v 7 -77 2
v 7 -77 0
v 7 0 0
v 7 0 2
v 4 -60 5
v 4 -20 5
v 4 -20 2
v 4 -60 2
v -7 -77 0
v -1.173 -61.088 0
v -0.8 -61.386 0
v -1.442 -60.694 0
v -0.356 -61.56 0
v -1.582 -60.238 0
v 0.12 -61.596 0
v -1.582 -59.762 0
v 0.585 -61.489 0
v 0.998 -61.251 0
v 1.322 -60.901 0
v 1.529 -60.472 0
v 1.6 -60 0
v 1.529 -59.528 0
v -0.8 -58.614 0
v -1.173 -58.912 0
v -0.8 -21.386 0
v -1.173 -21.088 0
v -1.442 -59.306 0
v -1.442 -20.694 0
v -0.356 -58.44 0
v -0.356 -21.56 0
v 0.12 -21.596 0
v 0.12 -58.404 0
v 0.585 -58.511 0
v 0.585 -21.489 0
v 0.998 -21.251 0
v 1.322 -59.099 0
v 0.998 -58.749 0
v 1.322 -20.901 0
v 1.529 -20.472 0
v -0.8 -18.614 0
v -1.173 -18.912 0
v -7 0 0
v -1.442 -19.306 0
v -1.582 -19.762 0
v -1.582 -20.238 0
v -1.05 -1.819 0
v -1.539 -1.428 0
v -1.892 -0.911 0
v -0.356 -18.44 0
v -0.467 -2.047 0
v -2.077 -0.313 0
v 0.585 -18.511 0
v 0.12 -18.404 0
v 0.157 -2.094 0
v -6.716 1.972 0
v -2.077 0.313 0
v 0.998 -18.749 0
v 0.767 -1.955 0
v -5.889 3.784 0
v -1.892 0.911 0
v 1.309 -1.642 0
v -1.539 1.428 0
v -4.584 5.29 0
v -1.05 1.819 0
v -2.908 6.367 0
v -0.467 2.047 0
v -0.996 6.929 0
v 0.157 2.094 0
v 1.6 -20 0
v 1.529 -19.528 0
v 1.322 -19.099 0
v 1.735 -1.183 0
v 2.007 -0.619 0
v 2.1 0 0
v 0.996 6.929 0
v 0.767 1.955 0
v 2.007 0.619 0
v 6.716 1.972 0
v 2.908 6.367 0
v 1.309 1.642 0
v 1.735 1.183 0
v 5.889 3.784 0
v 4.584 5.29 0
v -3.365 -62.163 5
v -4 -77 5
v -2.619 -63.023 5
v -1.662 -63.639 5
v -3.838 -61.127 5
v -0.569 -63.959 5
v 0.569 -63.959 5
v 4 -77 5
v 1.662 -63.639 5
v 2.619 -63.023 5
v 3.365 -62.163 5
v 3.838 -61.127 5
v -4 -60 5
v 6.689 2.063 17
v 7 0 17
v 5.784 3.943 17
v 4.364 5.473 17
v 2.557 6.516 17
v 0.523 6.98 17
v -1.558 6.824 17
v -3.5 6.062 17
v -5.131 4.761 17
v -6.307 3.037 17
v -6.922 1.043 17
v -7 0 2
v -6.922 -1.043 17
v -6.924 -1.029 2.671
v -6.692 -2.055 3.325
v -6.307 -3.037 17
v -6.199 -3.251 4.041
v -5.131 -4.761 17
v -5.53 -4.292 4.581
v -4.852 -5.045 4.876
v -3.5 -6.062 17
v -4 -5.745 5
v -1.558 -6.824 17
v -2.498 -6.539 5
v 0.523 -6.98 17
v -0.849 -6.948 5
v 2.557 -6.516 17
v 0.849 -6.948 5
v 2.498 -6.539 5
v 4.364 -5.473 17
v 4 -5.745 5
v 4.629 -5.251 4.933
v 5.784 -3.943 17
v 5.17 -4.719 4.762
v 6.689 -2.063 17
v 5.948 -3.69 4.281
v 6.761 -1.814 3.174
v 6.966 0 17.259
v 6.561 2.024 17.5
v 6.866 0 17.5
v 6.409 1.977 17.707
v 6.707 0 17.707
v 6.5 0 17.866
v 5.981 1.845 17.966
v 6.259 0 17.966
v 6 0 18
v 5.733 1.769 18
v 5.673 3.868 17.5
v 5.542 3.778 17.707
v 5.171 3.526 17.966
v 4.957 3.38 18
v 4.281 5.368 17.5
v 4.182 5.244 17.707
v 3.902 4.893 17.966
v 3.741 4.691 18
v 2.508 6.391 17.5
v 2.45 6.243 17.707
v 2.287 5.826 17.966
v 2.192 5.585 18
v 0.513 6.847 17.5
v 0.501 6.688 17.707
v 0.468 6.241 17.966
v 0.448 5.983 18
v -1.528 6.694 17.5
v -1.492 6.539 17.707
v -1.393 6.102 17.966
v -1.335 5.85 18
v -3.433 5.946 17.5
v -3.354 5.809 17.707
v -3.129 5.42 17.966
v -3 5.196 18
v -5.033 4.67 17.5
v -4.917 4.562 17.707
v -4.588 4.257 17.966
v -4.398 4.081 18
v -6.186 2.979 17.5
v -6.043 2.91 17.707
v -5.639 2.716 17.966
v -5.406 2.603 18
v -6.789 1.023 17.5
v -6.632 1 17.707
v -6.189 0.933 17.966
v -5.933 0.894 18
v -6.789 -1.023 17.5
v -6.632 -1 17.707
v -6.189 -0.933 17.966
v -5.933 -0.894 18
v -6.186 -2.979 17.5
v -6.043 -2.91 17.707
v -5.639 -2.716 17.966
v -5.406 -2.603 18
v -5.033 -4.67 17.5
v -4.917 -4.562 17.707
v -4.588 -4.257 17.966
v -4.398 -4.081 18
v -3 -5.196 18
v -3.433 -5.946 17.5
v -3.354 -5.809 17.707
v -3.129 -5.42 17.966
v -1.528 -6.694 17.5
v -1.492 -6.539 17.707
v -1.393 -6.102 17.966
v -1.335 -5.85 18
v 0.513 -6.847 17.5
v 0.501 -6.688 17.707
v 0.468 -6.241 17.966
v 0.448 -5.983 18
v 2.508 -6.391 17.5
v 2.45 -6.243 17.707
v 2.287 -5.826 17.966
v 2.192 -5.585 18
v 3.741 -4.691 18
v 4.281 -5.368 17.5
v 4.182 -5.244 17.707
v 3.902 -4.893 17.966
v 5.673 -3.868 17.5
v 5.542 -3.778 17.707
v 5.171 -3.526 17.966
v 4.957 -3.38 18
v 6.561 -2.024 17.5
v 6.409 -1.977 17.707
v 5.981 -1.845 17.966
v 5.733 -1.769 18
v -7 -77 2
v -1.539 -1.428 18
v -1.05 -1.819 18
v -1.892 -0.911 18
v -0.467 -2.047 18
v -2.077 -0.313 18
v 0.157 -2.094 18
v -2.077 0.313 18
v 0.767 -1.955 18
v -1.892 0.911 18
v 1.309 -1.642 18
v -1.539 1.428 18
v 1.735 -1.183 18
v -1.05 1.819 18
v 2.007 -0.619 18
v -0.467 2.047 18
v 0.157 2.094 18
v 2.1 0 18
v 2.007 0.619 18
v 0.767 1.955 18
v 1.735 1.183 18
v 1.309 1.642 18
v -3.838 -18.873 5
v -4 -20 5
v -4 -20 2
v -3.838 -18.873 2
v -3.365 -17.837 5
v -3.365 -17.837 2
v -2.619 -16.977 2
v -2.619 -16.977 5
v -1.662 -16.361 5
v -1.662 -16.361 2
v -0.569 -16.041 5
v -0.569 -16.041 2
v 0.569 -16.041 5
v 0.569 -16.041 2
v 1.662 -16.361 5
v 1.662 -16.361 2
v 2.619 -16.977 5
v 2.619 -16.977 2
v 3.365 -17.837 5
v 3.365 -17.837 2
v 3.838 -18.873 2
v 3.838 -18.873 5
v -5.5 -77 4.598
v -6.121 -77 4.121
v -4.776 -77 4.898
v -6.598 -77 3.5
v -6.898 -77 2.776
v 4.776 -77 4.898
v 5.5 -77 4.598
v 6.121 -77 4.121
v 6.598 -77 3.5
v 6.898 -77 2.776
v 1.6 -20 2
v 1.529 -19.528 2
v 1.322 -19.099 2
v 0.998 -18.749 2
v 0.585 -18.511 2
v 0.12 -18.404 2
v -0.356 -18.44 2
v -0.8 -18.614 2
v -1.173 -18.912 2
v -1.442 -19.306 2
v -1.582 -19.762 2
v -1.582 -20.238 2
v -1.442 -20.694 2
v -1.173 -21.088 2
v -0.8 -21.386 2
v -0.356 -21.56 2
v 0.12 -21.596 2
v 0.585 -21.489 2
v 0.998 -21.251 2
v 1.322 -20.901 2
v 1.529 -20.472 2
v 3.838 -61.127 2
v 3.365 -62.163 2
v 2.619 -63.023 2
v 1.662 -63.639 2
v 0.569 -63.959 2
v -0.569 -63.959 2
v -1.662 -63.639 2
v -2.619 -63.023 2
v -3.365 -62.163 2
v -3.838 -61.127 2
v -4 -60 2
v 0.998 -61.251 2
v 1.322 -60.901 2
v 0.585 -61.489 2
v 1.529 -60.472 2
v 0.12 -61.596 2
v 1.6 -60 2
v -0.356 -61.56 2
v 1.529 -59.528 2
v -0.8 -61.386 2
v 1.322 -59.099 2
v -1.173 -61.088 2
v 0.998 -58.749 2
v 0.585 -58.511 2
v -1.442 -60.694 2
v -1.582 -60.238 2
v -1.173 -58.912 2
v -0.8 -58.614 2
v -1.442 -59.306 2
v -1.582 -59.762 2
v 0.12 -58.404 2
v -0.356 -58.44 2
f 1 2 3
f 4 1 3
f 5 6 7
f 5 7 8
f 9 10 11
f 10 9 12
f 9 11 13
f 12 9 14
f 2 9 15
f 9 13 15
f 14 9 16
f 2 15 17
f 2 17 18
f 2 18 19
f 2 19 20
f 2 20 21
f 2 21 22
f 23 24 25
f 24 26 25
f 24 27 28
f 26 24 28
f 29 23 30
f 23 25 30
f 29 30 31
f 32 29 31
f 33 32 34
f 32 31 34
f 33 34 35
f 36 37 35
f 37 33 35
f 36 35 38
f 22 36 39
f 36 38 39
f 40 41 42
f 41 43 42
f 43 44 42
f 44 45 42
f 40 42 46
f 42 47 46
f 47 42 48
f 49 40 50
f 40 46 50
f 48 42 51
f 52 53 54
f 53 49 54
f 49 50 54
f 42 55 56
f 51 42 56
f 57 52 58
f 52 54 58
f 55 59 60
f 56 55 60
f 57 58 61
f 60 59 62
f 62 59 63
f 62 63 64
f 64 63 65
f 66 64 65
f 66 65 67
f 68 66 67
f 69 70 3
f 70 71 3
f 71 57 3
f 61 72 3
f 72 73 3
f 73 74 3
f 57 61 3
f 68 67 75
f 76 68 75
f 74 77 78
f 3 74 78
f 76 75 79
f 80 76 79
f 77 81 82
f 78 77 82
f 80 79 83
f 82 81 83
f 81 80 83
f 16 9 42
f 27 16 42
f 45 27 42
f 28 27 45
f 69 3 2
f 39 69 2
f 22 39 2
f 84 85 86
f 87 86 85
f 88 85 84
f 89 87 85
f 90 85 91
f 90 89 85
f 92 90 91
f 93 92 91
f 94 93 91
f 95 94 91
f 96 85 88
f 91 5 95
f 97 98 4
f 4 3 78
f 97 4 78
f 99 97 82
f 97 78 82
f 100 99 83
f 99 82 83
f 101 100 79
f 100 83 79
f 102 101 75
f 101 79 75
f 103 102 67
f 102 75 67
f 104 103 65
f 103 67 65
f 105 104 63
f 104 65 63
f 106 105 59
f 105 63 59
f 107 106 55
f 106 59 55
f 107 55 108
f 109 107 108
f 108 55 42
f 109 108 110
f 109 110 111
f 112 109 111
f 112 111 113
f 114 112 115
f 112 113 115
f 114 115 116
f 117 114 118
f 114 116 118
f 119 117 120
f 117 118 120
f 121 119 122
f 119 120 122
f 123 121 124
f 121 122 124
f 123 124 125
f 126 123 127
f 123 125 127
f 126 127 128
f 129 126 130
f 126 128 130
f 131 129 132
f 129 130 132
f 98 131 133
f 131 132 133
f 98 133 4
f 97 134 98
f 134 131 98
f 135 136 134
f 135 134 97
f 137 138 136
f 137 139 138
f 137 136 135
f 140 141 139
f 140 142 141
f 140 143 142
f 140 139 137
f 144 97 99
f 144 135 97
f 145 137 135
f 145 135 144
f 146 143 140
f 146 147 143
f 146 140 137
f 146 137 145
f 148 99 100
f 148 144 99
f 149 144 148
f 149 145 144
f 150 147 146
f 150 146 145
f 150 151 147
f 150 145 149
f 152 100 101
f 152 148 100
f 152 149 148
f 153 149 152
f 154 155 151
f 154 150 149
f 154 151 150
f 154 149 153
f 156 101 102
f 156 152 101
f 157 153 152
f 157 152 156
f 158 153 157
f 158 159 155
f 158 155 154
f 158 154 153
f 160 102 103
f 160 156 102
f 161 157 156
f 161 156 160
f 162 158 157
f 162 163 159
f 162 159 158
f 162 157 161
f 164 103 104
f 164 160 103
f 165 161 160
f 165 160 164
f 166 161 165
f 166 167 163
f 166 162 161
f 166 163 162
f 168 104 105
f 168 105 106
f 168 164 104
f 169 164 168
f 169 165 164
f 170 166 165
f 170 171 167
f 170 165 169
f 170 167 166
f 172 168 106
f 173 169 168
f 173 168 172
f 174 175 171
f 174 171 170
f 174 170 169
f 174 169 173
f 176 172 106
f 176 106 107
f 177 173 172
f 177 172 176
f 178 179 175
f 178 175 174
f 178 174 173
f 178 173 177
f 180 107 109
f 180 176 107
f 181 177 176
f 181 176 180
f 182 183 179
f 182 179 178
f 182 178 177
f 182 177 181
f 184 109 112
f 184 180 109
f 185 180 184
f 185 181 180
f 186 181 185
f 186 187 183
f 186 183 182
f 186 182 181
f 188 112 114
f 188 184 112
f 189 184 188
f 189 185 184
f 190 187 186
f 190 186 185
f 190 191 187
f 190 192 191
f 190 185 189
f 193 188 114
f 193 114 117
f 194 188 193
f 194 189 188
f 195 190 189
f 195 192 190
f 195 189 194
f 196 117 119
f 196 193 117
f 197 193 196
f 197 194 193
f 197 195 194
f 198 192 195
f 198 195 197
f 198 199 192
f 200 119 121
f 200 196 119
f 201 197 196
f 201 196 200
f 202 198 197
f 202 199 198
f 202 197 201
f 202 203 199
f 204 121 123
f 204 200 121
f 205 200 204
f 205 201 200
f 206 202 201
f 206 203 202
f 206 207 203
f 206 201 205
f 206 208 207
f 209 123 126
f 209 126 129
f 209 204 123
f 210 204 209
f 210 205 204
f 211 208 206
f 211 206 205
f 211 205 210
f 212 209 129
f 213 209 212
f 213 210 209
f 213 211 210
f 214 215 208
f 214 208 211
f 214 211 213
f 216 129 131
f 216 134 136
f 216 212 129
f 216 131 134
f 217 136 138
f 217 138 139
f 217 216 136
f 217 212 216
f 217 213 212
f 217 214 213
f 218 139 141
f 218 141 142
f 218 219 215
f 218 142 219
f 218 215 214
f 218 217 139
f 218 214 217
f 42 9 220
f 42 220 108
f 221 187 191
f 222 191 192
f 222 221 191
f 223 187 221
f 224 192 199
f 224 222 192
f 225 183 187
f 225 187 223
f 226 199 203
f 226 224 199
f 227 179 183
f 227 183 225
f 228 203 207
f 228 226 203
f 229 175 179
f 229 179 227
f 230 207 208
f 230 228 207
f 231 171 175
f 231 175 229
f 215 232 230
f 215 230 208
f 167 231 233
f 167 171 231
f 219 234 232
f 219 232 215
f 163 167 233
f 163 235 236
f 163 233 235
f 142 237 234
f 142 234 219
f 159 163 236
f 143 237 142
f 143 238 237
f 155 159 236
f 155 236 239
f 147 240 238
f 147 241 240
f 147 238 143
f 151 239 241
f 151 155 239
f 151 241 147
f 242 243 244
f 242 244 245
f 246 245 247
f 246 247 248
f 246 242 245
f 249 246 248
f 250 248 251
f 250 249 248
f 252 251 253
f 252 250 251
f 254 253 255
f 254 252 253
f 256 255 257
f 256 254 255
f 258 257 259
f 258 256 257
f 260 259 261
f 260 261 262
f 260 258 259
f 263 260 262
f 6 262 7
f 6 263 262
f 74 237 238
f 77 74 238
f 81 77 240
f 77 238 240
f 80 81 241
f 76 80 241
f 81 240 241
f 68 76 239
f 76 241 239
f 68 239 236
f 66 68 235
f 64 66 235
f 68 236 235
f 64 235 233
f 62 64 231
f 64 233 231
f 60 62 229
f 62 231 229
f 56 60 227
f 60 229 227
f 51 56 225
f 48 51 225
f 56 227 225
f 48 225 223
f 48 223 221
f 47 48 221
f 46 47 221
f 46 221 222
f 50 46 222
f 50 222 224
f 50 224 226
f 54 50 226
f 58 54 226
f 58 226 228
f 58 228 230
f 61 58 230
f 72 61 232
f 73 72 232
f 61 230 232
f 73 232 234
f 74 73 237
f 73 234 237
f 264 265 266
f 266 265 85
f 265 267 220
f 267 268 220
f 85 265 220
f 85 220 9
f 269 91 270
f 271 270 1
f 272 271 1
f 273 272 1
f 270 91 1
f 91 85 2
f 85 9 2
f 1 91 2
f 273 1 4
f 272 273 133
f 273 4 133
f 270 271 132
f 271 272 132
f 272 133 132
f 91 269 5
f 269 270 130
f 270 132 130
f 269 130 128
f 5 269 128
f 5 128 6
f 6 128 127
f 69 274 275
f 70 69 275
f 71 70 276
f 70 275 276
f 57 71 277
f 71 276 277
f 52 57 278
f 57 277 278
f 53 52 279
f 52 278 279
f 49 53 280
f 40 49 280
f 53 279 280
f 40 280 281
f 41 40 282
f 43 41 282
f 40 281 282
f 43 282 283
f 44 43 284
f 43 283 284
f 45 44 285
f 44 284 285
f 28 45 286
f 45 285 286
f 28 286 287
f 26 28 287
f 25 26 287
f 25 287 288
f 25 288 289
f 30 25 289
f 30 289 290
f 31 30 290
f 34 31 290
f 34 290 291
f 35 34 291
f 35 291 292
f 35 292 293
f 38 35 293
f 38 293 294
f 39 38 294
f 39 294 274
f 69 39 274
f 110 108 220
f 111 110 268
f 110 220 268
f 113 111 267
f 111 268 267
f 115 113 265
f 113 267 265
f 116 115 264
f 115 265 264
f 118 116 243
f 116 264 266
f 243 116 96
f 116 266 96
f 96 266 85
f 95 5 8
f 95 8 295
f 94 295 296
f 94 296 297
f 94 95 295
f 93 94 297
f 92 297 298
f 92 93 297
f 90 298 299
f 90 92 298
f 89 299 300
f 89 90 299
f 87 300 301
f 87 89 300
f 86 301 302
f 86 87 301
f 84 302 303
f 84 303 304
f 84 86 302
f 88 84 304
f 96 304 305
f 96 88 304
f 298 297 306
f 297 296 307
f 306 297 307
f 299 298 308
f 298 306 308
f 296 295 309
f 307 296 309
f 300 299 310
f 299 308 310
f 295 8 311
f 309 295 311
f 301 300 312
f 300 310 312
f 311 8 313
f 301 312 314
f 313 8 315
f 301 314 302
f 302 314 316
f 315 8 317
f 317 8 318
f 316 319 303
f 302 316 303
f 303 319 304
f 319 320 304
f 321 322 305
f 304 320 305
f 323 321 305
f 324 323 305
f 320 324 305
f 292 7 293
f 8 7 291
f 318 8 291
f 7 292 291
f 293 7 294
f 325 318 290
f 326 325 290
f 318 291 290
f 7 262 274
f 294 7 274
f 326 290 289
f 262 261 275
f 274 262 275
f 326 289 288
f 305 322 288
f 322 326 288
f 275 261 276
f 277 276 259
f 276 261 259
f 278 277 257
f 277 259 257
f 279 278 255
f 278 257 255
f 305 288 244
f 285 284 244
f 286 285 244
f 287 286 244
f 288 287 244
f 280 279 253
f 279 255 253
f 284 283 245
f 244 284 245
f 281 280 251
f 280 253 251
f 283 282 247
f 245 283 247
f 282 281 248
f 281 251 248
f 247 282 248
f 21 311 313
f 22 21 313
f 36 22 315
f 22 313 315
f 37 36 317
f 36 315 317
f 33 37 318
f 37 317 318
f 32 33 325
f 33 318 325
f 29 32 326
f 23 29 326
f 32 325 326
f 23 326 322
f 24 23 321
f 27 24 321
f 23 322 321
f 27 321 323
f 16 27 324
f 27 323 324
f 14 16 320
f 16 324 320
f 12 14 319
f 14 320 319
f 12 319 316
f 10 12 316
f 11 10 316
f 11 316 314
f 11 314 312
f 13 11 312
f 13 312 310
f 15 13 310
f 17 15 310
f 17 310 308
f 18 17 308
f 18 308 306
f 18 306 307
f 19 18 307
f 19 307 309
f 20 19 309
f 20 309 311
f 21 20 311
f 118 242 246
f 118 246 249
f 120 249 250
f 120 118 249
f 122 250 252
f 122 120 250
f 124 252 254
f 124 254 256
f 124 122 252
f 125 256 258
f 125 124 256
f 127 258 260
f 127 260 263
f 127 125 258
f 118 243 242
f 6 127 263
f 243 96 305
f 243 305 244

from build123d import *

# Parameters (mm, degrees)
SKETCH1_R           = 7
BOSS_EXTRUDE1_DEPTH = 18
SKETCH2_W           = 14
SKETCH2_H           = 77
BOSS_EXTRUDE2_DEPTH = 5
SKETCH8_R           = 2.1
CUT_EXTRUDE5_DEPTH  = 18
FILLET3_R           = 3
CUT_EXTRUDE6_DEPTH  = 3
SKETCH10_R          = 1.6
CUT_EXTRUDE7_DEPTH  = 3
FILLET4_R           = 1


with BuildPart() as part:
    # Sketch1 → Boss-Extrude1 (new body)
    with BuildSketch(Plane.XY):
        Circle(SKETCH1_R)
    extrude(amount=BOSS_EXTRUDE1_DEPTH)

    # Sketch2 → Boss-Extrude2 (add)
    with BuildSketch(Plane.XY):
        with Locations((0, -38.5)):
            Rectangle(SKETCH2_W, SKETCH2_H)
    extrude(amount=BOSS_EXTRUDE2_DEPTH)

    # Sketch8 → Cut-Extrude5 (cut)
    with BuildSketch(Plane.XY.offset(18)):
        Circle(SKETCH8_R)
    extrude(amount=-CUT_EXTRUDE5_DEPTH, mode=Mode.SUBTRACT)

    # Fillet3
    # the kernel refuses this fillet: 3 mm, written as the material it takes off along each edge
    with BuildSketch(Plane(origin=(7, 7.5, 5), x_dir=(-1, 0, 0), z_dir=(0, -1, 0))) as fillet3_piece_1_section:
        with BuildLine():
            CenterArc((FILLET3_R, FILLET3_R), FILLET3_R, 180, 90)
            Line((0, FILLET3_R), (0, 0))
            Line((0, 0), (FILLET3_R, 0))
        make_face()
    fillet3_piece_1 = extrude(amount=92, mode=Mode.PRIVATE)
    fillet3_piece_1 = fillet3_piece_1 - Plane(origin=(0, 0, 4.306838987), x_dir=(1, 0, 0), z_dir=(0, 0, -1)) * Cylinder(7, 196, mode=Mode.PRIVATE)
    add(fillet3_piece_1, mode=Mode.SUBTRACT)
    with BuildSketch(Plane(origin=(-7, -84.5, 5), x_dir=(0, 0, -1), z_dir=(0, 1, 0))) as fillet3_piece_2_section:
        with BuildLine():
            CenterArc((FILLET3_R, -FILLET3_R), FILLET3_R, 90, 90)
            Line((0, -FILLET3_R), (0, 0))
            Line((0, 0), (FILLET3_R, 0))
        make_face()
    fillet3_piece_2 = extrude(amount=92, mode=Mode.PRIVATE)
    fillet3_piece_2 = fillet3_piece_2 - Plane(origin=(0, 0, 4.306838506), x_dir=(1, 0, 0), z_dir=(0, 0, -1)) * Cylinder(7, 196, mode=Mode.PRIVATE)
    add(fillet3_piece_2, mode=Mode.SUBTRACT)

    # Sketch6 → Cut-Extrude6 (cut)
    with BuildSketch(Plane.XY.offset(5)):
        with BuildLine():
            Line((4, -20), (4, -60))
            ThreePointArc((4, -60), (0, -64), (-4, -60))
            Line((-4, -60), (-4, -20))
            ThreePointArc((-4, -20), (0, -16), (4, -20))
        make_face()
    extrude(amount=-CUT_EXTRUDE6_DEPTH, mode=Mode.SUBTRACT)

    # Sketch10 → Cut-Extrude7 (cut)
    with BuildSketch(Plane.XY.offset(2)):
        with Locations((0, -20)):
            Circle(SKETCH10_R)
        with Locations((0, -60)):
            Circle(SKETCH10_R)
    extrude(amount=-CUT_EXTRUDE7_DEPTH, mode=Mode.SUBTRACT)

    # Fillet4
    fillet4_edges = [part.edges().sort_by_distance(p)[0] for p in [
        (-7, 0, 18),
    ]]
    fillet(fillet4_edges, radius=FILLET4_R)


solid = part.part
